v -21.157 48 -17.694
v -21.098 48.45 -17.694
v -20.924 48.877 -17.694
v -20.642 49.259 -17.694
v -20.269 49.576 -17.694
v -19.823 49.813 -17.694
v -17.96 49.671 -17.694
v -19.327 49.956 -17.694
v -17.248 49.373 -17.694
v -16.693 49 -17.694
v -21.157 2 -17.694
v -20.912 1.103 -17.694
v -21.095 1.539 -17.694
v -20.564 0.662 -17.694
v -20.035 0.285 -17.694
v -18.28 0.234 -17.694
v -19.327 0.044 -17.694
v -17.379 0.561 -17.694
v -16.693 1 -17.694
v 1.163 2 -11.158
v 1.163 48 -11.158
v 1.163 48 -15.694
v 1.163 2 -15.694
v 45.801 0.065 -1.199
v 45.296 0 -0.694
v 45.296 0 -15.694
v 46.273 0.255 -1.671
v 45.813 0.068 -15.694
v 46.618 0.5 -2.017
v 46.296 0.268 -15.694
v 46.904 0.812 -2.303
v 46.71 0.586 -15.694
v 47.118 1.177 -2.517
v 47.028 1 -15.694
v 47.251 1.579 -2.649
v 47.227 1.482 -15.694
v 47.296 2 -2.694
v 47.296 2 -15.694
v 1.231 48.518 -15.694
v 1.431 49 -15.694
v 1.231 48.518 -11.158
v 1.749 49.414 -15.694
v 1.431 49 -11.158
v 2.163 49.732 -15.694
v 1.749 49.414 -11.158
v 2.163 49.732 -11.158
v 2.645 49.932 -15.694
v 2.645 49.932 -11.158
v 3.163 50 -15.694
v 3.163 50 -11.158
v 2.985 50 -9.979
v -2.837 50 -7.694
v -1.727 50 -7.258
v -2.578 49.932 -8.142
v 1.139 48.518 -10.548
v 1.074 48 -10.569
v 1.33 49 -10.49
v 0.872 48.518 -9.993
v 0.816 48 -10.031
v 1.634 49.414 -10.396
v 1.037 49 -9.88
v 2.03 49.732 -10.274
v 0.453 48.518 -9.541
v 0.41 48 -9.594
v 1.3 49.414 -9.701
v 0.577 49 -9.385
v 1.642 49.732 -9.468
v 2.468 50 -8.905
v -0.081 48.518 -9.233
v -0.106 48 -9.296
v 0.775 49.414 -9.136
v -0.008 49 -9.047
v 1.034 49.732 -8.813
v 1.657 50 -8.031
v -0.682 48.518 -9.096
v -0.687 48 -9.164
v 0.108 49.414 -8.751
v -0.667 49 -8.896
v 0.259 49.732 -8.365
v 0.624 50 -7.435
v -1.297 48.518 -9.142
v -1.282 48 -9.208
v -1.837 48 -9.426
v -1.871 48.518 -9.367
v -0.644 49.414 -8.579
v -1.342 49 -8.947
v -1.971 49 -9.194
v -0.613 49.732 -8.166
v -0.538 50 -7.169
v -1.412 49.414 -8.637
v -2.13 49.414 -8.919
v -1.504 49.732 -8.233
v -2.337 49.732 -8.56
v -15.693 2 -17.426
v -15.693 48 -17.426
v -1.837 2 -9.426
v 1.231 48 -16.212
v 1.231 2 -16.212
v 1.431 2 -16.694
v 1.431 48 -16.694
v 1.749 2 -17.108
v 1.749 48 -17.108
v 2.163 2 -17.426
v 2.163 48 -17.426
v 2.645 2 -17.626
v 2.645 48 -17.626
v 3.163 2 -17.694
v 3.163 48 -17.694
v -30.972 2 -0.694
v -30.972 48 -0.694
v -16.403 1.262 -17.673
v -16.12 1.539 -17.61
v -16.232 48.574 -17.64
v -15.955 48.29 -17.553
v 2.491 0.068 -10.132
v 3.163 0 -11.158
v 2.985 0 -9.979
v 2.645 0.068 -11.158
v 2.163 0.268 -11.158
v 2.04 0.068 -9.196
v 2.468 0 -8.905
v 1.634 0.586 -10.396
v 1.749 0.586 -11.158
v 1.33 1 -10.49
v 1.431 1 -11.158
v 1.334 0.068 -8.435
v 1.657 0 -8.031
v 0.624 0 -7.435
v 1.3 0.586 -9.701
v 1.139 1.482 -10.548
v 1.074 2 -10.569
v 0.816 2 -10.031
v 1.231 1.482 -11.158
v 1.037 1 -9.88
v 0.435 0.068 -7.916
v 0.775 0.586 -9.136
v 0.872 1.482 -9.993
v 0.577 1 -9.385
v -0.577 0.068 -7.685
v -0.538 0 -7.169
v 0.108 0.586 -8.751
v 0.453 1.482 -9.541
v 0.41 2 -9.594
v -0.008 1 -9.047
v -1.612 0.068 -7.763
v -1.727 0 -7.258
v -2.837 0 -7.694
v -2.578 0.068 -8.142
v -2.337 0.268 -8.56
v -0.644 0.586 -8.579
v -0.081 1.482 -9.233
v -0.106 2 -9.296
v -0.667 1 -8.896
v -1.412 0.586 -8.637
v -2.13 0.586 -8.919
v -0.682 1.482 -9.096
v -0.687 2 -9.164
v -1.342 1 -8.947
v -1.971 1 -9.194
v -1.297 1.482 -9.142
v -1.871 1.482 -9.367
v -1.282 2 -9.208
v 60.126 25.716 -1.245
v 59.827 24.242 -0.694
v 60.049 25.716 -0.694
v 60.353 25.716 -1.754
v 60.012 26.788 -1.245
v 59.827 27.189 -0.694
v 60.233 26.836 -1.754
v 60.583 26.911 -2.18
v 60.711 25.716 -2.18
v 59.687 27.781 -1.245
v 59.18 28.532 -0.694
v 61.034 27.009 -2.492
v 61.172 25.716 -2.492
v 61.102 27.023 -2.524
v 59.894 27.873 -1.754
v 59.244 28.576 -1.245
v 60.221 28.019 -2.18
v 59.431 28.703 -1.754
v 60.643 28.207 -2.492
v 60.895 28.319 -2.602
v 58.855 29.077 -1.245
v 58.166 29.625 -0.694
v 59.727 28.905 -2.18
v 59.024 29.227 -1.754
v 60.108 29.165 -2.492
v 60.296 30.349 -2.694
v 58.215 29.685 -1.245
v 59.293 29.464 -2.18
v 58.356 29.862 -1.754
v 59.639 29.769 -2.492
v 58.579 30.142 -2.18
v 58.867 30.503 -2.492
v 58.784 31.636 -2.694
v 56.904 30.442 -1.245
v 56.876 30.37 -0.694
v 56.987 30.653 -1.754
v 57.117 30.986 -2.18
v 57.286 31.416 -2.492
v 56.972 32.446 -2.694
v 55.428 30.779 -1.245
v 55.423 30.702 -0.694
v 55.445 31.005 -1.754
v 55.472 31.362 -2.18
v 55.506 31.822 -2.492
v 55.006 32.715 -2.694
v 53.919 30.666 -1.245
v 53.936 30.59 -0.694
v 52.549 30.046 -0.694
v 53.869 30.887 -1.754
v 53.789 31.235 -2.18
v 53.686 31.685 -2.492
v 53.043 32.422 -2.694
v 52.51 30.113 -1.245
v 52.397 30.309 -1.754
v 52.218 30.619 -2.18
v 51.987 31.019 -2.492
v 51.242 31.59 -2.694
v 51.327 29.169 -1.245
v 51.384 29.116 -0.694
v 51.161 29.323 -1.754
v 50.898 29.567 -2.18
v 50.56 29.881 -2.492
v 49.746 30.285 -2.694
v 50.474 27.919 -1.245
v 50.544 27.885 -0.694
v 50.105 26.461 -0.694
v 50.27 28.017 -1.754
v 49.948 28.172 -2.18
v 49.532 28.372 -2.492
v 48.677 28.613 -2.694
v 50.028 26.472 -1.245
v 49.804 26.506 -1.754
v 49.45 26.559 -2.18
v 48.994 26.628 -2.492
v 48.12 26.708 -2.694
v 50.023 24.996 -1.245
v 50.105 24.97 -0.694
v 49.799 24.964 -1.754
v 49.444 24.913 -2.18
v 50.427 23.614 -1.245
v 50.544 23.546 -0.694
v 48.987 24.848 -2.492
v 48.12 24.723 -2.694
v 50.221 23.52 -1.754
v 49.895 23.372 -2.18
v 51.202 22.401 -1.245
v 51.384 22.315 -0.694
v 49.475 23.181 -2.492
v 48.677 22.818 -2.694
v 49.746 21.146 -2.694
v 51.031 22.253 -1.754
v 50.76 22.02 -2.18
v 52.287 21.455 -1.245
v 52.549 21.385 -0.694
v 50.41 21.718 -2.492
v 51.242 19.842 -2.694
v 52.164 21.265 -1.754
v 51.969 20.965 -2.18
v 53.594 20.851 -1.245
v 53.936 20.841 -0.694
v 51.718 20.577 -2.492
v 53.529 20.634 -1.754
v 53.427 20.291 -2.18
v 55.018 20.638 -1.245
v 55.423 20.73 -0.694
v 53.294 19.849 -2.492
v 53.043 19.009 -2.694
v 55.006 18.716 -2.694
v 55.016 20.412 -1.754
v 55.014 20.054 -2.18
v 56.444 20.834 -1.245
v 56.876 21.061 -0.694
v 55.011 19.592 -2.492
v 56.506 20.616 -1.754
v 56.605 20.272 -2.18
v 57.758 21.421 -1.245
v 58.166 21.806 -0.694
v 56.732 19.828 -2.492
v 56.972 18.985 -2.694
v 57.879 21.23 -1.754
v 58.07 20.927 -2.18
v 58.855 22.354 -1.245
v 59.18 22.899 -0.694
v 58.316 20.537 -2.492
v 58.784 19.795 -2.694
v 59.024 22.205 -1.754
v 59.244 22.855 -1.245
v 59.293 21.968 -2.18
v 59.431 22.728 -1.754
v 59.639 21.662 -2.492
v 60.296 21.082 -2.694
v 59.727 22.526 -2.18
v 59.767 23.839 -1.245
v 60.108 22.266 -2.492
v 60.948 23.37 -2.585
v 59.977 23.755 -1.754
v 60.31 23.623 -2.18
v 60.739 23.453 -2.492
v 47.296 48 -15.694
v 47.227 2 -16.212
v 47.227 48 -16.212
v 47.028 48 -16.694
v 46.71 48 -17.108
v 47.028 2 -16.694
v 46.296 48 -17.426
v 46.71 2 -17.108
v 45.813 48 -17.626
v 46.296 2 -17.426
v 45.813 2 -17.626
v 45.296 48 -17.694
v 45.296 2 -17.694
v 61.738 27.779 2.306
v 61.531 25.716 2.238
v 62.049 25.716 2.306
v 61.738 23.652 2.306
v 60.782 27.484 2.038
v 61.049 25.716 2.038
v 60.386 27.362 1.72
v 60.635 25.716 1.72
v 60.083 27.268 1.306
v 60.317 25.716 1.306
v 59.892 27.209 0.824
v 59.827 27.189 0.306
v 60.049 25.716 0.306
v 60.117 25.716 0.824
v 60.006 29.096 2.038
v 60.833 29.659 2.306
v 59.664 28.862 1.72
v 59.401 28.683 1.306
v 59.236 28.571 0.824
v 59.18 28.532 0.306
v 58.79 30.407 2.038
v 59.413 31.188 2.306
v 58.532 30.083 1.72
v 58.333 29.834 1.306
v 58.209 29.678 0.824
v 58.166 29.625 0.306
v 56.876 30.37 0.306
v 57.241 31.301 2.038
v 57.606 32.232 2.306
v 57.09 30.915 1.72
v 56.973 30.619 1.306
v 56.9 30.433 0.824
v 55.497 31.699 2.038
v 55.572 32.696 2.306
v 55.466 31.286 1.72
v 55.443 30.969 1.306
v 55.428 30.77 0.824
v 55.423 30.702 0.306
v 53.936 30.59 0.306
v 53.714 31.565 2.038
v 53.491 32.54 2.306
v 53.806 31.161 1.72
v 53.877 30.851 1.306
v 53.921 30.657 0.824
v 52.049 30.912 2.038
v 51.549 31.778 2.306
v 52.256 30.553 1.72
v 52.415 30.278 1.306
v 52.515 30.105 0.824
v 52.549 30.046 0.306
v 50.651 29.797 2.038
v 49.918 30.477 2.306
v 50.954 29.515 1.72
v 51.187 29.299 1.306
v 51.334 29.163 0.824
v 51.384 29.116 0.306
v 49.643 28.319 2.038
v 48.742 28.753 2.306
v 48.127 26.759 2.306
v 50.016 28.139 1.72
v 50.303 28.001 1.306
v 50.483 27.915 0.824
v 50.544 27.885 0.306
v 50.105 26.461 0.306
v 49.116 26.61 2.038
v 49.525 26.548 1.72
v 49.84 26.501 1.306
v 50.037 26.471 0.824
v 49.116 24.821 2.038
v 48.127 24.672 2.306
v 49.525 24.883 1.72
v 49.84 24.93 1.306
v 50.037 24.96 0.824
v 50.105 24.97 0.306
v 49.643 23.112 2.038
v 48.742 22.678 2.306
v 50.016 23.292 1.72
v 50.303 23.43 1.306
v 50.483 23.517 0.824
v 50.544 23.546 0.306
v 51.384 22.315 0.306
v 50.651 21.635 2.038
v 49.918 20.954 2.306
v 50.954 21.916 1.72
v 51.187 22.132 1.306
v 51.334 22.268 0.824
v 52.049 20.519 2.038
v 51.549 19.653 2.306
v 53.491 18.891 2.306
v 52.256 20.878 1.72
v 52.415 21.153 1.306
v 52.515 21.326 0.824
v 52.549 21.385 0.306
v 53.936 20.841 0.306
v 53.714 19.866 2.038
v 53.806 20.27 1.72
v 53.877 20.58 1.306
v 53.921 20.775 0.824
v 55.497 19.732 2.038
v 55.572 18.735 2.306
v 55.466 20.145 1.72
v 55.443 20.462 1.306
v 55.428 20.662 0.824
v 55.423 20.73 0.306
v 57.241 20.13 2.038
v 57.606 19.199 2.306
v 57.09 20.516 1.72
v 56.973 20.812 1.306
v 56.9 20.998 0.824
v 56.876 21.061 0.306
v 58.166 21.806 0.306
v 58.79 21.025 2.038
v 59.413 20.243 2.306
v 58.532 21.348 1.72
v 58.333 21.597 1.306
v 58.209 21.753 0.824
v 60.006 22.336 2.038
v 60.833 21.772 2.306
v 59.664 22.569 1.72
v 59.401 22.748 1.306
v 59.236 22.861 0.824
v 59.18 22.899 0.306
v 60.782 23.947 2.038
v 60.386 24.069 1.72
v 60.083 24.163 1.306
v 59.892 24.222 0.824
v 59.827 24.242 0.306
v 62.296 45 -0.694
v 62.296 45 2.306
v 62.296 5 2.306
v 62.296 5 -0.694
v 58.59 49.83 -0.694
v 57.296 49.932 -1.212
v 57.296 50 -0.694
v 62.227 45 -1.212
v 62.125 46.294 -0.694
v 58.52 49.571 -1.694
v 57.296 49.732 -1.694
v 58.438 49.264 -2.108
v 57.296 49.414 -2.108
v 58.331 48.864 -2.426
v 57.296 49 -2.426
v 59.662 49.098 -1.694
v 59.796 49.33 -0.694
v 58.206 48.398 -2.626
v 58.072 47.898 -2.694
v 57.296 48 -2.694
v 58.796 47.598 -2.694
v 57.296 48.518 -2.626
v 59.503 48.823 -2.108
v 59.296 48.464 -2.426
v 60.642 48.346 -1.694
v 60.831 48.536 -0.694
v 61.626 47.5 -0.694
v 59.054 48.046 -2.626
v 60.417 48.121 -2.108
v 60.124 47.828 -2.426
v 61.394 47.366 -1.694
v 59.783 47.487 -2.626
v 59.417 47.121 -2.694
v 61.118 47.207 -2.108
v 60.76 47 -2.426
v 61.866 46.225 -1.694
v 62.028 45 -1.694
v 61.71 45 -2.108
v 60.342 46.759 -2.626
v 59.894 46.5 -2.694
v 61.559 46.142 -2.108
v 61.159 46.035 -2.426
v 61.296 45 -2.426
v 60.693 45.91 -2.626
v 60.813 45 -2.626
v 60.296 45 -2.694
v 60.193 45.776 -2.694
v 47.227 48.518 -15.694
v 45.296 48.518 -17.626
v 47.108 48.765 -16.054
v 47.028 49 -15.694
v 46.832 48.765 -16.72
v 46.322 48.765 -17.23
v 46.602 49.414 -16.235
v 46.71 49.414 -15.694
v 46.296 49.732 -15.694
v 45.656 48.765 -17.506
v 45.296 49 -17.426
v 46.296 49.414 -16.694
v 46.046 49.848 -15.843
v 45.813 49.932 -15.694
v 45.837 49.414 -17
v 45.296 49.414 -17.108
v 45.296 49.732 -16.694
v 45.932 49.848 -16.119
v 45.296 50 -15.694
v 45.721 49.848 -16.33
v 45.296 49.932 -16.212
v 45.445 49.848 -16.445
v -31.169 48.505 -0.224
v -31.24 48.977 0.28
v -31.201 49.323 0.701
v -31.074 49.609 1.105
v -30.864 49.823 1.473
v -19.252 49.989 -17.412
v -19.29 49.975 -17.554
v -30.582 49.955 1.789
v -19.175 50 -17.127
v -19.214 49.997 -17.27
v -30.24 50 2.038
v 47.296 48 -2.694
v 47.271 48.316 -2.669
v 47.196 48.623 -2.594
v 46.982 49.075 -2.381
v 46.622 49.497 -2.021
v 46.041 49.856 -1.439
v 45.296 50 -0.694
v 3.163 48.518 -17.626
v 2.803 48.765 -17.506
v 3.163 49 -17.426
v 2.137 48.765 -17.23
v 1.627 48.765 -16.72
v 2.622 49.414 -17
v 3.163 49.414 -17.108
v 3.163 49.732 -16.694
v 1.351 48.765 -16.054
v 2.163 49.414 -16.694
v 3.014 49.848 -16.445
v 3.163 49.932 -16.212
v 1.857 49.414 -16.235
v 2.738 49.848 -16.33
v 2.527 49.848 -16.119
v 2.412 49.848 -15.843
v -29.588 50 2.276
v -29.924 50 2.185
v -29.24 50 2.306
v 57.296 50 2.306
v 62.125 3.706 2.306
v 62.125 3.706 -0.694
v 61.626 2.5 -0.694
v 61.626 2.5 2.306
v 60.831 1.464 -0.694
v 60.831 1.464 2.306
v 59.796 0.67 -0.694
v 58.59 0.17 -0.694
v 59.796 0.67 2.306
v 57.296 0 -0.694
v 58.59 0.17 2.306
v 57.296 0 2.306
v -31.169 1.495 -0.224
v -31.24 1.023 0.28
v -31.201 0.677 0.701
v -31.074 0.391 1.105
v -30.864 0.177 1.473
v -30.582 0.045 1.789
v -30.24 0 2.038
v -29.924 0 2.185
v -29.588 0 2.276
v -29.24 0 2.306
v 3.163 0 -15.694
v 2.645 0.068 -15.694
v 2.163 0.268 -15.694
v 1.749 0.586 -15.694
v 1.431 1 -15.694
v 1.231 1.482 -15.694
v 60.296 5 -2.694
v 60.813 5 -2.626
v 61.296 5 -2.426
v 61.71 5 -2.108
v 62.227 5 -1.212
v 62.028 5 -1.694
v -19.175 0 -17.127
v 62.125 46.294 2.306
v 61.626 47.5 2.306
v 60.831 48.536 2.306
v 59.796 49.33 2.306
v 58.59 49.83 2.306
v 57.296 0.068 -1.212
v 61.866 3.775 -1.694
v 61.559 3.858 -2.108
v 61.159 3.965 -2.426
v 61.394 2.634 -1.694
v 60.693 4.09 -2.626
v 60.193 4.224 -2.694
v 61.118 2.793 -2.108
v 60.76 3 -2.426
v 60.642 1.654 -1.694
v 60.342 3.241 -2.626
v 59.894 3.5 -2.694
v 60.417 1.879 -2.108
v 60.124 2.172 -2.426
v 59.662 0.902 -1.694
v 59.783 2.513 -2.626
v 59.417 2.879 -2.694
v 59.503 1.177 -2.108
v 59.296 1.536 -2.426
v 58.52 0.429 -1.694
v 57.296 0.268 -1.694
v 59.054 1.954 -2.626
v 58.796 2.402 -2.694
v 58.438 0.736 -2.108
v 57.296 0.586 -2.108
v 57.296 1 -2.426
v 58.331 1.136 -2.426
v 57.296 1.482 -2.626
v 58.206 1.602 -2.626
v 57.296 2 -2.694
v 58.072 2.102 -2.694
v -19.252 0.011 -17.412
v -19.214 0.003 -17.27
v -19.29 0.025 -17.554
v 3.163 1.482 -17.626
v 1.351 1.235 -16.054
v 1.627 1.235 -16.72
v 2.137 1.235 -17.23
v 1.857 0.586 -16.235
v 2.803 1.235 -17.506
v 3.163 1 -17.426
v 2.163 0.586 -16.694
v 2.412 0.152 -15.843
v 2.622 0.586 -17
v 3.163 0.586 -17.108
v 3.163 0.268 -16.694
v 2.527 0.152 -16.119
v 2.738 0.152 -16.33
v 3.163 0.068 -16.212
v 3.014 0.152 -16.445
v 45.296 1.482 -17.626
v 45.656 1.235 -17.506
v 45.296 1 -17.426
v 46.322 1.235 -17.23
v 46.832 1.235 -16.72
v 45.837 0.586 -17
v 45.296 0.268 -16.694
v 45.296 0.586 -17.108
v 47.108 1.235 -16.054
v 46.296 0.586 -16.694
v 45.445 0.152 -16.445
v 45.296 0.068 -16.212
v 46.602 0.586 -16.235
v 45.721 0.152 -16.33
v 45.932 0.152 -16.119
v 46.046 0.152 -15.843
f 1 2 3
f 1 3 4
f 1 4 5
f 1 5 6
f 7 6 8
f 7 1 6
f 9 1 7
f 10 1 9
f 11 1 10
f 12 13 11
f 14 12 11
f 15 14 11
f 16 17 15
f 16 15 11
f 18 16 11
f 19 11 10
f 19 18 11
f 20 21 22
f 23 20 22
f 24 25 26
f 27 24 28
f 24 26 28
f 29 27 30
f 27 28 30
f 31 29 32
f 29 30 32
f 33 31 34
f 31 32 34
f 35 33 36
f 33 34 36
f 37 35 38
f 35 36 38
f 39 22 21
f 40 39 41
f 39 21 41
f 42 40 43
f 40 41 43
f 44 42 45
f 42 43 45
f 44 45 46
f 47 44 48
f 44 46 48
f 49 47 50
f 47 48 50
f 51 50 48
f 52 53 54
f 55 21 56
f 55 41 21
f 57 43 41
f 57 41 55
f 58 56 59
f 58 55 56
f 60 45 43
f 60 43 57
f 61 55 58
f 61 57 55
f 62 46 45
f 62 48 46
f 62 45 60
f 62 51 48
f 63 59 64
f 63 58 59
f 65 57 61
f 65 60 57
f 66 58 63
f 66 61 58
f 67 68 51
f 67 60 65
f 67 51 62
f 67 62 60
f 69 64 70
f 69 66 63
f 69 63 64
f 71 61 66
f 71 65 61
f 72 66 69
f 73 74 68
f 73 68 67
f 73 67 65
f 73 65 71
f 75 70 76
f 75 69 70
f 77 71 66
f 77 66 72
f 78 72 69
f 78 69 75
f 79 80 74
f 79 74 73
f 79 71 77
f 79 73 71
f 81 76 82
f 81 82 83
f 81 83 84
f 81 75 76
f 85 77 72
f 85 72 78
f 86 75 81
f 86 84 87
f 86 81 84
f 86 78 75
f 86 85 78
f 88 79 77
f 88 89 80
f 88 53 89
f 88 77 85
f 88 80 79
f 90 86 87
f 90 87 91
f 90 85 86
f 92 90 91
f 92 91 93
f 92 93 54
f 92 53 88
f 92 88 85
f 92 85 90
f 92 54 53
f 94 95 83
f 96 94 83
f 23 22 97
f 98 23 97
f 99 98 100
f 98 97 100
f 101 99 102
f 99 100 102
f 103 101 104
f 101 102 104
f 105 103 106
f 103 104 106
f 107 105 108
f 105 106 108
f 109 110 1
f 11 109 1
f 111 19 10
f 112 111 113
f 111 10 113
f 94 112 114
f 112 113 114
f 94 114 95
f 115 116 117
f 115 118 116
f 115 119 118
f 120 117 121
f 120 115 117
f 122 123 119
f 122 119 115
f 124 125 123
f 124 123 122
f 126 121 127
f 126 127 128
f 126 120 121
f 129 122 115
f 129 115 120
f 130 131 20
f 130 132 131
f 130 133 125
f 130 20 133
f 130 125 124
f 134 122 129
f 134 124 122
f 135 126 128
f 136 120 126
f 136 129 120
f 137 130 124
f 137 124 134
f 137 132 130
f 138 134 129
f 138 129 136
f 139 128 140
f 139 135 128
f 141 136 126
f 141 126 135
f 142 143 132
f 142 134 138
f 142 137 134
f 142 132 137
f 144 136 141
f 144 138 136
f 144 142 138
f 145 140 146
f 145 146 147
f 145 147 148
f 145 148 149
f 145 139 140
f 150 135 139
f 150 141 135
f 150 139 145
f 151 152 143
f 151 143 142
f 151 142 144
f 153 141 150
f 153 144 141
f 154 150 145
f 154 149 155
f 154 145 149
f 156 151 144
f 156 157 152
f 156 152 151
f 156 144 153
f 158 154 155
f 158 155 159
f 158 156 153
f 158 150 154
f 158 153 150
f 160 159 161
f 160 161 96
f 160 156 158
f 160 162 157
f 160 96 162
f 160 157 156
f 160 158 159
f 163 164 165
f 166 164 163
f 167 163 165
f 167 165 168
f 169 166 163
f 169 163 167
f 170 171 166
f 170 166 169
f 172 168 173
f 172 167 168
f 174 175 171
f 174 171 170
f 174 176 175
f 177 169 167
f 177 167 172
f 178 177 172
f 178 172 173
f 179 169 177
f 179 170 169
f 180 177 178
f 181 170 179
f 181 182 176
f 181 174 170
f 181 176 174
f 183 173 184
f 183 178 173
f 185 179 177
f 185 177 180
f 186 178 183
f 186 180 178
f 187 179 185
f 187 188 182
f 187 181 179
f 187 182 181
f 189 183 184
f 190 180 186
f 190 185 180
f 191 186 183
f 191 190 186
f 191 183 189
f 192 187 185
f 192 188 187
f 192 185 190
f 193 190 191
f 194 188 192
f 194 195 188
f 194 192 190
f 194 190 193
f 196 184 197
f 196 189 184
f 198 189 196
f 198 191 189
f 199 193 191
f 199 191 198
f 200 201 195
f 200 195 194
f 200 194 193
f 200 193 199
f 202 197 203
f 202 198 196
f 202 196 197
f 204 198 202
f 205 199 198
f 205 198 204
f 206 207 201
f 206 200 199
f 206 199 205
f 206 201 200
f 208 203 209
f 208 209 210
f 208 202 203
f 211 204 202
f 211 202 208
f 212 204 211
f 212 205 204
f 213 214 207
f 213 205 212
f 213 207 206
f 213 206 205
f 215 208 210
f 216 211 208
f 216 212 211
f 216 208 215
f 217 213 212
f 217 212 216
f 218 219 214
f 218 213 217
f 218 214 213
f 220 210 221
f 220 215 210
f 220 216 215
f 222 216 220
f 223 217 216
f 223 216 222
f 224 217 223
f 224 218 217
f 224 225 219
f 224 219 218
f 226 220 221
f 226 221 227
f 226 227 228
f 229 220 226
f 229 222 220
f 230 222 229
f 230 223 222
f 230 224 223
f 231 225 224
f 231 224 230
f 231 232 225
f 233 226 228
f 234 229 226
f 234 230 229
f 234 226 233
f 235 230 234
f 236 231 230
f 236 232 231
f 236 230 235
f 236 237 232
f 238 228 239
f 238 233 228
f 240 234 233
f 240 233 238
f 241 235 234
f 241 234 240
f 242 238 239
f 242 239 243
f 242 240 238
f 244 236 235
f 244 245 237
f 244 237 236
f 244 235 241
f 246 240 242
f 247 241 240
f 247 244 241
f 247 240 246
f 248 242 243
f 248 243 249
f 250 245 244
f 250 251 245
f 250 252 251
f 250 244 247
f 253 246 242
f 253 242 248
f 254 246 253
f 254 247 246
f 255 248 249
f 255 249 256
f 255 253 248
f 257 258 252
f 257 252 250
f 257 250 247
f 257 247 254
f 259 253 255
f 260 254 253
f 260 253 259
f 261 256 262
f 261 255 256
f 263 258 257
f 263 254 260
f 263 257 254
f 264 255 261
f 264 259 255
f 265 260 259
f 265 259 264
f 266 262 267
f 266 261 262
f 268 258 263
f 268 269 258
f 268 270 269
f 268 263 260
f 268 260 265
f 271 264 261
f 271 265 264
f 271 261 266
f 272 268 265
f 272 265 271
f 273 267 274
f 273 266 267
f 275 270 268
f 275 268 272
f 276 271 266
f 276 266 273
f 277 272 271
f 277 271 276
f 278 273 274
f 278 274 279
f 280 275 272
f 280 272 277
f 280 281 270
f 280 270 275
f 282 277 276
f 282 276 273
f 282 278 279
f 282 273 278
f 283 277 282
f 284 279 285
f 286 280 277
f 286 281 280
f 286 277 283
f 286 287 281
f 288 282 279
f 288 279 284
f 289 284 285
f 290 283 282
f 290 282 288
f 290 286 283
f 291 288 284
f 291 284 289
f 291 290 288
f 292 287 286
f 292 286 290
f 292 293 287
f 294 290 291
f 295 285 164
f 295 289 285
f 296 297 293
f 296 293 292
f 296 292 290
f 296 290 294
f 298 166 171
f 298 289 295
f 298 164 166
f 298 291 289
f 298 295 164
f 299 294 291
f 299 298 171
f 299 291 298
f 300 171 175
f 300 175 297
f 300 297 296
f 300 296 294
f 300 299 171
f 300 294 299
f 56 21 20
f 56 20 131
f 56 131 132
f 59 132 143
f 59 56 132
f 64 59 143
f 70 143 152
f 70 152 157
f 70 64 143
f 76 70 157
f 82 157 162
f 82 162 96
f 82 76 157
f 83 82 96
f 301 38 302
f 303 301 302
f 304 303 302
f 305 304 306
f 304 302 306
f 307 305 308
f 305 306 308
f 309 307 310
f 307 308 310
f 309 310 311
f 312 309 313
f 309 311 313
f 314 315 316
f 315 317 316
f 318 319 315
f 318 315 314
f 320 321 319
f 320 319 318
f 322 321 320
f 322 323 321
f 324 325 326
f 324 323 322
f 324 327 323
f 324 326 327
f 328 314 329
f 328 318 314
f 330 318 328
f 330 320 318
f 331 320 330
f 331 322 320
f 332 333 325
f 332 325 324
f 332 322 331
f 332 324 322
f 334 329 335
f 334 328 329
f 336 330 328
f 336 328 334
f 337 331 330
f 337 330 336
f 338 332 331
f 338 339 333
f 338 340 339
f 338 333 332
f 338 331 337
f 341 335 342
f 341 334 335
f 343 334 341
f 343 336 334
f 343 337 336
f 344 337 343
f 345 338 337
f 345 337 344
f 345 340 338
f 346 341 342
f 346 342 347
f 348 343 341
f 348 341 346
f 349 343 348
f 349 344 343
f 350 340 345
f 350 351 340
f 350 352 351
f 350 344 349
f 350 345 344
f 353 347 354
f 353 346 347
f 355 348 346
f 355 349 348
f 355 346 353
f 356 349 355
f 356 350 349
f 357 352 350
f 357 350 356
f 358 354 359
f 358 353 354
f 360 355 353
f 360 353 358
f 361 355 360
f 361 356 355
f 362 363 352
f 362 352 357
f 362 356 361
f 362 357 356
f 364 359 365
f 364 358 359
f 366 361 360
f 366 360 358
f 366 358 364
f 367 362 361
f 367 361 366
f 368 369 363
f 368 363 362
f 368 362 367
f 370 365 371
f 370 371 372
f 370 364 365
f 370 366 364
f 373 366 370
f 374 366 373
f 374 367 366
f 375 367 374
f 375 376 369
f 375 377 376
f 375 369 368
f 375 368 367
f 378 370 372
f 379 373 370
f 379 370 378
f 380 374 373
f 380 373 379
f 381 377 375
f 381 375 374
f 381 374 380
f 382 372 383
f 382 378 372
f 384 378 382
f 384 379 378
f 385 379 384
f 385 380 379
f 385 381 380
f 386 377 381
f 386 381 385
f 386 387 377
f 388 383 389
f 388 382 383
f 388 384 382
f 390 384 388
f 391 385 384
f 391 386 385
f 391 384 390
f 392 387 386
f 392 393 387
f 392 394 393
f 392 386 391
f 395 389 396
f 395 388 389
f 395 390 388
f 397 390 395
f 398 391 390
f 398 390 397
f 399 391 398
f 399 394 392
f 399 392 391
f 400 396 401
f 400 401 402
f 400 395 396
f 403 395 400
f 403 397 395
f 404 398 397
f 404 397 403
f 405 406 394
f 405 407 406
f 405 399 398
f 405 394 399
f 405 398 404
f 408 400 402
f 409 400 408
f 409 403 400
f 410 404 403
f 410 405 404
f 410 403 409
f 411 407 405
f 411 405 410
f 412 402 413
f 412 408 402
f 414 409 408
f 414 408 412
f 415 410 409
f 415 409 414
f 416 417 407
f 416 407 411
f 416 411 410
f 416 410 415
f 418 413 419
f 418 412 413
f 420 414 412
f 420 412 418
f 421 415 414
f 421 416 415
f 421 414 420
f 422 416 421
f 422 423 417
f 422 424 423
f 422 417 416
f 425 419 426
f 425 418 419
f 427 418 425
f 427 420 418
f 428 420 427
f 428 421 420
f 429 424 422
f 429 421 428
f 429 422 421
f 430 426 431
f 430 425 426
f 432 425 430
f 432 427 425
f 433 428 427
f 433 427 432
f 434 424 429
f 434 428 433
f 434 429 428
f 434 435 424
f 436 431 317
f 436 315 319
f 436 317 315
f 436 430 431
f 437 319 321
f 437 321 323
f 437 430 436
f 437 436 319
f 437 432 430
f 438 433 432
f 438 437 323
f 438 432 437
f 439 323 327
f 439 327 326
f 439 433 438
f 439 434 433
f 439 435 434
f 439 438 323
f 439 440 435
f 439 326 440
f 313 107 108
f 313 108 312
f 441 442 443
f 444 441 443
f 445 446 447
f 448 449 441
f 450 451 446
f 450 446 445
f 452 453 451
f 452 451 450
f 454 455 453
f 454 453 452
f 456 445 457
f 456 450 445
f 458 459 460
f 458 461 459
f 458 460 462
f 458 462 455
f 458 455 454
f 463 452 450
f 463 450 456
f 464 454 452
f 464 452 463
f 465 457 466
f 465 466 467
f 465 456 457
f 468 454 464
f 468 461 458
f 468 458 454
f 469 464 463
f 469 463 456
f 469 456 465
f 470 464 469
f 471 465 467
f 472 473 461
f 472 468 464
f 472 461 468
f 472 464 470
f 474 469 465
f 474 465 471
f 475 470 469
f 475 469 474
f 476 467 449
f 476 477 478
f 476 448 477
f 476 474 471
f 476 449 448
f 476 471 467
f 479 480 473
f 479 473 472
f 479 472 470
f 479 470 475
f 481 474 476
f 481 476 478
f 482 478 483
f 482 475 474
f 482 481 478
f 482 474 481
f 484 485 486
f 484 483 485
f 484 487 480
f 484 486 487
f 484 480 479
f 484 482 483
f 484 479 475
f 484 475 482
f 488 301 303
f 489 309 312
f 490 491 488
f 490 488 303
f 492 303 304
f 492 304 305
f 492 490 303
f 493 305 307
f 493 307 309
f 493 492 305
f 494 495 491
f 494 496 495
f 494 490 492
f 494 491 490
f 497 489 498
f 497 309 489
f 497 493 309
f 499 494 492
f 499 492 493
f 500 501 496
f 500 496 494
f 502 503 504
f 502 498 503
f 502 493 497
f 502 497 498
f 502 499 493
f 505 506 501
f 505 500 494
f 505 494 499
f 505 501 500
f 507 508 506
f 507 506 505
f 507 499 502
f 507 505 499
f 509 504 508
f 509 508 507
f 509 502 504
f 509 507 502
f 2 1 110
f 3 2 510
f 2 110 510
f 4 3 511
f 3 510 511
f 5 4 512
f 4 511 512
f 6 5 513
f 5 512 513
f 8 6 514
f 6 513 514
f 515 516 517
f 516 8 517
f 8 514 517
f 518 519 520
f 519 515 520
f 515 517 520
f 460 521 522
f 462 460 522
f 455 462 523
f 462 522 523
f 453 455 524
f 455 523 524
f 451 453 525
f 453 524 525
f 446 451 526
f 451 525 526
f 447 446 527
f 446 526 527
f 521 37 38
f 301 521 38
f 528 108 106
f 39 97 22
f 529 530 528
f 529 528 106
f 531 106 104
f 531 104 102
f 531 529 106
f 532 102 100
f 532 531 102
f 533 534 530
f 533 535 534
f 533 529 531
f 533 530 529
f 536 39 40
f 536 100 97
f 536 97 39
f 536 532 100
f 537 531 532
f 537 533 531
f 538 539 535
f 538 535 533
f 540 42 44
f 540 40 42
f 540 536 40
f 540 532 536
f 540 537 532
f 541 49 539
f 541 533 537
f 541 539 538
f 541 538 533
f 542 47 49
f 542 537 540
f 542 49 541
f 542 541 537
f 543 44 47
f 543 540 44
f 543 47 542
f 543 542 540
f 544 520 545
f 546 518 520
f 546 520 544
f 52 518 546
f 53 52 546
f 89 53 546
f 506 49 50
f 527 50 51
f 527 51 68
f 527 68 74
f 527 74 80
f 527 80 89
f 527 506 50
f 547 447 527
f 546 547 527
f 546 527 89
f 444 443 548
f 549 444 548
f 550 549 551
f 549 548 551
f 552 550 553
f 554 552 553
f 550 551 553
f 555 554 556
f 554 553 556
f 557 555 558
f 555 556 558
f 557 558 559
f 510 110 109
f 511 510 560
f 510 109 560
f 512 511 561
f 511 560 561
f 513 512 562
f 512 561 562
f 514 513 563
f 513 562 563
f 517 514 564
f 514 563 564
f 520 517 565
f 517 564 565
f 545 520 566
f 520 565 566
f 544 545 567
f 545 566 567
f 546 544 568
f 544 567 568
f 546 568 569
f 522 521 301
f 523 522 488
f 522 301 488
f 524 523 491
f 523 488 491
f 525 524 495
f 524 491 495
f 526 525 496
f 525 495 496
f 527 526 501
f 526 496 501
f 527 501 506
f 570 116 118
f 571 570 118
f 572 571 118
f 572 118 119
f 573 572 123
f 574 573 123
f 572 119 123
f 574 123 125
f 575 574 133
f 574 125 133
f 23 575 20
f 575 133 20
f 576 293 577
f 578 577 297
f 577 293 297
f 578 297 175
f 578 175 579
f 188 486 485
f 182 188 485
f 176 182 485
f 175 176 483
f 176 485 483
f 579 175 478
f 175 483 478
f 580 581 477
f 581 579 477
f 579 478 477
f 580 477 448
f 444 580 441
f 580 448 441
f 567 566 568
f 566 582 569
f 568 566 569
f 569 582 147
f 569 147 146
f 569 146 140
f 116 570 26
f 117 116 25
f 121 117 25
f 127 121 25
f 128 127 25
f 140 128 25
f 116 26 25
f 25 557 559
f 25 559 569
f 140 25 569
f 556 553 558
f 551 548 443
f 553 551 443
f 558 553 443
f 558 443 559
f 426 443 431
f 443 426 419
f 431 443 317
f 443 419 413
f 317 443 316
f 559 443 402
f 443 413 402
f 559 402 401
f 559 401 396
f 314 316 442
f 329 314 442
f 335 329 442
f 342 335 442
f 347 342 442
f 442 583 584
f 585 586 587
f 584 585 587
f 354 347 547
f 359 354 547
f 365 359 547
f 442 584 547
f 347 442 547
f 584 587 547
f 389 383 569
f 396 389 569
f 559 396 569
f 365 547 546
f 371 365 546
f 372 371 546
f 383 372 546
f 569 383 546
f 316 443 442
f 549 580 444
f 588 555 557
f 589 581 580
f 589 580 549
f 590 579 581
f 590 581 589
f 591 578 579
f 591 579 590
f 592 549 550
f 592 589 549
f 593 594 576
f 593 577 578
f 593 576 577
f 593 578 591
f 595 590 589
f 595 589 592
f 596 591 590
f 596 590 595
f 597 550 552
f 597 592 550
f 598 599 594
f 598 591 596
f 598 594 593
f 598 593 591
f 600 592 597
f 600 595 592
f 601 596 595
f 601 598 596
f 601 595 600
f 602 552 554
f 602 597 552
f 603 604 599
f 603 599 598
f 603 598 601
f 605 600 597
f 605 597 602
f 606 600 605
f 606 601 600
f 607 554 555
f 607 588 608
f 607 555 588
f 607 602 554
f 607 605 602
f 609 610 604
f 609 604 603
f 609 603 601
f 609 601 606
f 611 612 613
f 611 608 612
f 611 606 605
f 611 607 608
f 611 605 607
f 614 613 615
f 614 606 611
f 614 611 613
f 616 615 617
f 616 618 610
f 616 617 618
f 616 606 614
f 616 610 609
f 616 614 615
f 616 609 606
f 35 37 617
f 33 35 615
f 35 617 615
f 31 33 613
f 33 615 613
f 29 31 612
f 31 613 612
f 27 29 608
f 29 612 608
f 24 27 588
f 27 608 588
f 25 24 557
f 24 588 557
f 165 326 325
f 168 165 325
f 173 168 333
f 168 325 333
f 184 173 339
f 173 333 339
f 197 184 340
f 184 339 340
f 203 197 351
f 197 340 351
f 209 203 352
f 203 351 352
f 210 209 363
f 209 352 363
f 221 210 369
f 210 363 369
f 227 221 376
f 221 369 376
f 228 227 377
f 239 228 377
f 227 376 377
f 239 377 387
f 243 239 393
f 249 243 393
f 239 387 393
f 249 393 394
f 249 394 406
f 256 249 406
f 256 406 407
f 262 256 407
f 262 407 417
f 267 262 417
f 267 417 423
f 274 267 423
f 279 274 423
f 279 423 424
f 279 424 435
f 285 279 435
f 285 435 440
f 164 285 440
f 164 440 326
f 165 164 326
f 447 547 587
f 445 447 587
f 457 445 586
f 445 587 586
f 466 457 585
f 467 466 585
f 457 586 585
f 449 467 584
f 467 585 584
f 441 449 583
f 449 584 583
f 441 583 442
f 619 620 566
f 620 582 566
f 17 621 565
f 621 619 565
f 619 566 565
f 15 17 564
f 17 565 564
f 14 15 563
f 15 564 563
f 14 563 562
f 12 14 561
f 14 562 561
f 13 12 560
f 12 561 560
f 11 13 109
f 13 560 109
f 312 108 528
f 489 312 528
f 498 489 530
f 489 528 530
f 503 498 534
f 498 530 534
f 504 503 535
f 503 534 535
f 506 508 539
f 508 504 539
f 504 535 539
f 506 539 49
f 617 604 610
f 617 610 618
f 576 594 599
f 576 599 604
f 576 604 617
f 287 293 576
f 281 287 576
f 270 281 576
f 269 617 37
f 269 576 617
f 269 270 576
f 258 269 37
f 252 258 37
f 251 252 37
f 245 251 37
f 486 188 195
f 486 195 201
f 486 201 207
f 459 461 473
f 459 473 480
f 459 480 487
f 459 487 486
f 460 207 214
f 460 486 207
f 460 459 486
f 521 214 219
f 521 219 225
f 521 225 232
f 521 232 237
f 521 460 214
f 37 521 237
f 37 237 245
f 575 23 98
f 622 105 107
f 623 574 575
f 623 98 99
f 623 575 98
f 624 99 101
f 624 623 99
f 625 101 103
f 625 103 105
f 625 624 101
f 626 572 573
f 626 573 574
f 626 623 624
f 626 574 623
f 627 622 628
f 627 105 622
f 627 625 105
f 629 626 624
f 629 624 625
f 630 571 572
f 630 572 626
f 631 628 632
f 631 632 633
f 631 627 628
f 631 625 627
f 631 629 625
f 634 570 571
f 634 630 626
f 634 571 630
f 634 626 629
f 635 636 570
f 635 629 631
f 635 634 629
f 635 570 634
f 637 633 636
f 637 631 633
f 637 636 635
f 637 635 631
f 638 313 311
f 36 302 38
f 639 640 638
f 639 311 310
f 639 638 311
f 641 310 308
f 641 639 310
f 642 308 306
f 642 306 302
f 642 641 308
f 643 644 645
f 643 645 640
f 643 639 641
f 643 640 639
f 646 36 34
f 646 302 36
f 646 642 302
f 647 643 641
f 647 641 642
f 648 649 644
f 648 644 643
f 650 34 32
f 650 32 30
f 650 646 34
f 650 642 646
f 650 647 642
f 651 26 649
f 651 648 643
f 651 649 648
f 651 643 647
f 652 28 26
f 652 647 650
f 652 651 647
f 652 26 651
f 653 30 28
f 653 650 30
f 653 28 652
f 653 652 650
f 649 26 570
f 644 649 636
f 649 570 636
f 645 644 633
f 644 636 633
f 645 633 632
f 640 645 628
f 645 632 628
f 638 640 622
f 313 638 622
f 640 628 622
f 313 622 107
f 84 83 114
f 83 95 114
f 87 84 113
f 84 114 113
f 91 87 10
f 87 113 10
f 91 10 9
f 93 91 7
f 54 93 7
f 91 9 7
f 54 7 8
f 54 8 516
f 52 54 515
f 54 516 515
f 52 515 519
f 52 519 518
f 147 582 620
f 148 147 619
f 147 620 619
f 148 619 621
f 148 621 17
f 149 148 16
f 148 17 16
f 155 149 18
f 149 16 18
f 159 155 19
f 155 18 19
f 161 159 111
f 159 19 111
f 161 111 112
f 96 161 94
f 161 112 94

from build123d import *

# Parameters (mm, degrees)
SKETCH2_W           = 80
SKETCH2_H           = 20
BOSS_EXTRUDE1_DEPTH = 50
CUT_EXTRUDE1_DEPTH  = 50
SKETCH5_R           = 5
BOSS_EXTRUDE2_DEPTH = 5
FILLET1_R           = 2


with BuildPart() as part:
    # Sketch2 → Boss-Extrude1 (new body)
    with BuildSketch(Plane(origin=(0, 0, 0), x_dir=(1, 0, 0), z_dir=(0, 1, 0))):
        with Locations((7.295597484, 7.693920335)):
            Rectangle(SKETCH2_W, SKETCH2_H)
    extrude(amount=BOSS_EXTRUDE1_DEPTH)

    # Sketch3 → Cut-Extrude1 (cut)
    with BuildSketch(Plane(origin=(0, 50, 0), x_dir=(1, 0, 0), z_dir=(0, 1, 0))):
        Polygon((-32.704402516, 17.693920335), (-32.704402516, -2.306079665), (-21.157397132, 17.693920335), align=None)
        Polygon((1.163110944, 17.693920335), (-16.157397132, 17.693920335), (1.163110944, 7.693920335), align=None)
    extrude(amount=-CUT_EXTRUDE1_DEPTH, mode=Mode.SUBTRACT)

    # Sketch5 → Boss-Extrude2 (add)
    with BuildSketch(Plane.XY.offset(2.306079665)):
        with BuildLine():
            Line((47.295597484, 50), (57.295597484, 50))
            ThreePointArc((57.295597484, 50), (60.83113139, 48.535533906), (62.295597484, 45))
            Line((62.295597484, 45), (62.295597484, 5))
            ThreePointArc((62.295597484, 5), (60.83113139, 1.464466094), (57.295597484, 0))
            Line((57.295597484, 0), (47.295597484, 0))
            Line((47.295597484, 0), (47.295597484, 50))
        make_face()
        with Locations((55.048868237, 25.715581395)):
            Circle(SKETCH5_R, mode=Mode.SUBTRACT)
    extrude(amount=-BOSS_EXTRUDE2_DEPTH)

    # Fillet1
    # the kernel refuses this fillet: 2 mm, written as the material it adds along each edge
    with BuildSketch(Plane(origin=(1.163110944, 50, -7.693920335), x_dir=(0, 0, -1), z_dir=(0, -1, 0))) as fillet1_piece_1:
        with BuildLine():
            CenterArc((FILLET1_R * 1.73205080757, -FILLET1_R), FILLET1_R, 90, 120)
            Line((FILLET1_R * 0.866025403784, -FILLET1_R * 1.5), (0, 0))
            Line((0, 0), (FILLET1_R * 1.73205080757, 0))
        make_face()
    extrude(amount=50)
    # the kernel refuses this fillet: 2 mm, written as the material it takes off along each edge
    with BuildSketch(Plane(origin=(3.163110944, 2, -15.693920335), x_dir=(-1, 0, 0), z_dir=(0, -1, 0))) as fillet1_2_piece_1_section:
        Polygon((0, 0), (FILLET1_R, 0), (FILLET1_R, FILLET1_R), (0, FILLET1_R), align=None)
    fillet1_2_piece_1 = extrude(amount=FILLET1_R, mode=Mode.PRIVATE)
    fillet1_2_piece_1 = fillet1_2_piece_1 - Plane(origin=(3.163110944, 2, -15.693920335), x_dir=(0.7071067811865475, 0, 0.7071067811865475), z_dir=(0, -1, 0)) * Sphere(FILLET1_R, mode=Mode.PRIVATE)
    add(fillet1_2_piece_1, mode=Mode.SUBTRACT)
    with BuildSketch(Plane(origin=(3.163110944, 48, -15.693920335), x_dir=(-1, 0, 0), z_dir=(0, 1, 0))) as fillet1_2_piece_2_section:
        Polygon((0, 0), (FILLET1_R, 0), (FILLET1_R, -FILLET1_R), (0, -FILLET1_R), align=None)
    fillet1_2_piece_2 = extrude(amount=FILLET1_R, mode=Mode.PRIVATE)
    fillet1_2_piece_2 = fillet1_2_piece_2 - Plane(origin=(3.163110944, 48, -15.693920335), x_dir=(0.7071067811865475, 0, 0.7071067811865475), z_dir=(0, 1, 0)) * Sphere(FILLET1_R, mode=Mode.PRIVATE)
    add(fillet1_2_piece_2, mode=Mode.SUBTRACT)
    with BuildSketch(Plane(origin=(45.295597484, 2, -15.693920335), x_dir=(0, 0, -1), z_dir=(0, -1, 0))) as fillet1_2_piece_3_section:
        Polygon((0, 0), (FILLET1_R, 0), (FILLET1_R, FILLET1_R), (0, FILLET1_R), align=None)
    fillet1_2_piece_3 = extrude(amount=FILLET1_R, mode=Mode.PRIVATE)
    fillet1_2_piece_3 = fillet1_2_piece_3 - Plane(origin=(45.295597484, 2, -15.693920335), x_dir=(-0.7071067811865474, 0, 0.7071067811865477), z_dir=(0, -1, 0)) * Sphere(FILLET1_R, mode=Mode.PRIVATE)
    add(fillet1_2_piece_3, mode=Mode.SUBTRACT)
    with BuildSketch(Plane(origin=(45.295597484, 48, -15.693920335), x_dir=(0, 0, -1), z_dir=(0, 1, 0))) as fillet1_2_piece_4_section:
        Polygon((0, 0), (FILLET1_R, 0), (FILLET1_R, -FILLET1_R), (0, -FILLET1_R), align=None)
    fillet1_2_piece_4 = extrude(amount=FILLET1_R, mode=Mode.PRIVATE)
    fillet1_2_piece_4 = fillet1_2_piece_4 - Plane(origin=(45.295597484, 48, -15.693920335), x_dir=(-0.7071067811865474, 0, 0.7071067811865477), z_dir=(0, 1, 0)) * Sphere(FILLET1_R, mode=Mode.PRIVATE)
    add(fillet1_2_piece_4, mode=Mode.SUBTRACT)
    with BuildSketch(Plane(origin=(1.163110944, 0, -11.158021951), x_dir=(1, 0, 0), z_dir=(0, 0, -1))) as fillet1_2_piece_5:
        with BuildLine():
            CenterArc((FILLET1_R, -FILLET1_R), FILLET1_R, 90, 90)
            Line((0, -FILLET1_R), (0, 0))
            Line((0, 0), (FILLET1_R, 0))
        make_face()
    extrude(amount=4.535898385, mode=Mode.SUBTRACT)
    with BuildSketch(Plane(origin=(1.163110944, 50, -11.158021951), x_dir=(1, 0, 0), z_dir=(0, 0, -1))) as fillet1_2_piece_6:
        with BuildLine():
            CenterArc((FILLET1_R, FILLET1_R), FILLET1_R, 180, 90)
            Line((0, FILLET1_R), (0, 0))
            Line((0, 0), (FILLET1_R, 0))
        make_face()
    extrude(amount=4.535898385, mode=Mode.SUBTRACT)
    with BuildSketch(Plane(origin=(57.295597484, 0, -2.693920335), x_dir=(0, 0, 1), z_dir=(-1, 0, 0)), Plane(origin=(47.295597484, 50, -2.693920335), x_dir=(0, 0, 1), z_dir=(1, 0, 0))) as fillet1_2_piece_7:
        with BuildLine():
            CenterArc((FILLET1_R, FILLET1_R), FILLET1_R, 180, 90)
            Line((0, FILLET1_R), (0, 0))
            Line((0, 0), (FILLET1_R, 0))
        make_face()
    extrude(amount=10, mode=Mode.SUBTRACT)
    with BuildSketch(Plane(origin=(57.295597484, 5, -2.693920335), x_dir=(1, 0, 0), z_dir=(0, 1, 0))) as fillet1_2_piece_8:
        with BuildLine():
            CenterArc((5 - FILLET1_R, -FILLET1_R), FILLET1_R, 0, 90)
            Line((5, -FILLET1_R), (5, 0))
            Line((5, 0), (5 - FILLET1_R, 0))
        make_face()
    revolve(axis=Axis((57.295597484, 5, -2.693920335), (0, 0, -1)), revolution_arc=90, mode=Mode.SUBTRACT)
    with BuildSketch(Plane(origin=(62.295597484, 45, -2.693920335), x_dir=(-1, 0, 0), z_dir=(0, -1, 0))) as fillet1_2_piece_9:
        with BuildLine():
            CenterArc((FILLET1_R, -FILLET1_R), FILLET1_R, 90, 90)
            Line((0, -FILLET1_R), (0, 0))
            Line((0, 0), (FILLET1_R, 0))
        make_face()
    extrude(amount=40, mode=Mode.SUBTRACT)
    with BuildSketch(Plane(origin=(57.295597484, 45, -2.693920335), x_dir=(0, 1, 0), z_dir=(-1, 0, 0))) as fillet1_2_piece_10:
        with BuildLine():
            CenterArc((5 - FILLET1_R, -FILLET1_R), FILLET1_R, 0, 90)
            Line((5, -FILLET1_R), (5, 0))
            Line((5, 0), (5 - FILLET1_R, 0))
        make_face()
    revolve(axis=Axis((57.295597484, 45, -2.693920335), (0, 0, -1)), revolution_arc=90, mode=Mode.SUBTRACT)
    with BuildSketch(Plane(origin=(47.295597484, 2, -17.693920335), x_dir=(-1, 0, 0), z_dir=(0, 1, 0))) as fillet1_2_piece_11:
        with BuildLine():
            CenterArc((FILLET1_R, FILLET1_R), FILLET1_R, 180, 90)
            Line((0, FILLET1_R), (0, 0))
            Line((0, 0), (FILLET1_R, 0))
        make_face()
    extrude(amount=46, mode=Mode.SUBTRACT)
    with BuildSketch(Plane(origin=(3.163110944, 50, -17.693920335), x_dir=(0, 0, 1), z_dir=(1, 0, 0))) as fillet1_2_piece_12:
        with BuildLine():
            CenterArc((FILLET1_R, FILLET1_R), FILLET1_R, 180, 90)
            Line((0, FILLET1_R), (0, 0))
            Line((0, 0), (FILLET1_R, 0))
        make_face()
    extrude(amount=42.132486541, mode=Mode.SUBTRACT)
    with BuildSketch(Plane(origin=(1.163110944, 48, -17.693920335), x_dir=(0, 0, 1), z_dir=(0, -1, 0))) as fillet1_2_piece_13:
        with BuildLine():
            CenterArc((FILLET1_R, -FILLET1_R), FILLET1_R, 90, 90)
            Line((0, -FILLET1_R), (0, 0))
            Line((0, 0), (FILLET1_R, 0))
        make_face()
    extrude(amount=46, mode=Mode.SUBTRACT)
    with BuildSketch(Plane(origin=(3.163110944, 0, -17.693920335), x_dir=(0, 0, 1), z_dir=(1, 0, 0))) as fillet1_2_piece_14:
        with BuildLine():
            CenterArc((FILLET1_R, -FILLET1_R), FILLET1_R, 90, 90)
            Line((0, -FILLET1_R), (0, 0))
            Line((0, 0), (FILLET1_R, 0))
        make_face()
    extrude(amount=42.132486541, mode=Mode.SUBTRACT)
    with BuildSketch(Plane(origin=(55.048868237, 25.715581395, 2.306079665), x_dir=(1, 0, 0), z_dir=(0, -1, 0))) as fillet1_2_piece_15:
        with BuildLine():
            CenterArc((5 + FILLET1_R, -FILLET1_R), FILLET1_R, 90, 90)
            Line((5, -FILLET1_R), (5, 0))
            Line((5, 0), (5 + FILLET1_R, 0))
        make_face()
    revolve(axis=Axis((55.048868237, 25.715581395, 2.306079665), (0, 0, 1)), mode=Mode.SUBTRACT)
    with BuildSketch(Plane(origin=(55.048868237, 25.715581395, -2.693920335), x_dir=(1, 0, 0), z_dir=(0, -1, 0))) as fillet1_2_piece_16:
        with BuildLine():
            CenterArc((5 + FILLET1_R, FILLET1_R), FILLET1_R, 180, 90)
            Line((5, FILLET1_R), (5, 0))
            Line((5, 0), (5 + FILLET1_R, 0))
        make_face()
    revolve(axis=Axis((55.048868237, 25.715581395, -2.693920335), (0, 0, 1)), mode=Mode.SUBTRACT)
    with BuildSketch(Plane(origin=(47.295597484, 0, -15.693920335), x_dir=(-1, 0, 0), z_dir=(0, 0, 1))) as fillet1_2_piece_17:
        with BuildLine():
            CenterArc((FILLET1_R, -FILLET1_R), FILLET1_R, 90, 90)
            Line((0, -FILLET1_R), (0, 0))
            Line((0, 0), (FILLET1_R, 0))
        make_face()
    extrude(amount=13, mode=Mode.SUBTRACT)
    with BuildSketch(Plane(origin=(47.295597484, 50, -15.693920335), x_dir=(-1, 0, 0), z_dir=(0, 0, 1))) as fillet1_2_piece_18:
        with BuildLine():
            CenterArc((FILLET1_R, FILLET1_R), FILLET1_R, 180, 90)
            Line((0, FILLET1_R), (0, 0))
            Line((0, 0), (FILLET1_R, 0))
        make_face()
    extrude(amount=13, mode=Mode.SUBTRACT)
    with BuildSketch(Plane(origin=(-20.487524151, 0, -20.193920335), x_dir=(-0.4999999999999946, 0, 0.8660254037844418), z_dir=(0.8660254037844418, 0, 0.4999999999999946)), Plane(origin=(-20.487524151, 50, -20.193920335), x_dir=(0, -1, 0), z_dir=(0.8660254037844418, 0, 0.4999999999999946))) as fillet1_2_piece_19:
        with BuildLine():
            CenterArc((FILLET1_R, -FILLET1_R), FILLET1_R, 90, 90)
            Line((0, -FILLET1_R), (0, 0))
            Line((0, 0), (FILLET1_R, 0))
        make_face()
    extrude(amount=21.535898385, mode=Mode.SUBTRACT)
    with BuildSketch(Plane(origin=(-16.157397132, 51.339745962, -17.693920335), x_dir=(-1, 0, 0), z_dir=(0, -1, 0))) as fillet1_2_piece_20:
        with BuildLine():
            CenterArc((FILLET1_R * 0.267949192431, -FILLET1_R), FILLET1_R, 90, 30)
            Line((-FILLET1_R * 0.232050807569, -FILLET1_R * 0.133974596216), (0, 0))
            Line((0, 0), (FILLET1_R * 0.267949192431, 0))
        make_face()
    extrude(amount=52.679491924, mode=Mode.SUBTRACT)
    with BuildSketch(Plane(origin=(-32.704402516, -8.660254038, 2.306079665), x_dir=(0.49999999999999467, 0, -0.8660254037844417), z_dir=(0, 1, 0))) as fillet1_2_piece_21:
        with BuildLine():
            CenterArc((FILLET1_R * 1.73205080757, -FILLET1_R), FILLET1_R, 90, 120)
            Line((FILLET1_R * 0.866025403784, -FILLET1_R * 1.5), (0, 0))
            Line((0, 0), (FILLET1_R * 1.73205080757, 0))
        make_face()
    extrude(amount=67.320508076, mode=Mode.SUBTRACT)
    with BuildSketch(Plane(origin=(-35.204402516, 0, 6.636206683), x_dir=(0.8660254037844418, 0, 0.49999999999999445), z_dir=(0.4999999999999945, 0, -0.8660254037844419))) as fillet1_2_piece_22:
        with BuildLine():
            CenterArc((FILLET1_R, -FILLET1_R), FILLET1_R, 90, 90)
            Line((0, -FILLET1_R), (0, 0))
            Line((0, 0), (FILLET1_R, 0))
        make_face()
    extrude(amount=33.094010768, mode=Mode.SUBTRACT)
    with BuildSketch(Plane(origin=(-35.204402516, 50, 6.636206683), x_dir=(0.8660254037844418, 0, 0.49999999999999445), z_dir=(0.4999999999999945, 0, -0.8660254037844419))) as fillet1_2_piece_23:
        with BuildLine():
            CenterArc((FILLET1_R, FILLET1_R), FILLET1_R, 180, 90)
            Line((0, FILLET1_R), (0, 0))
            Line((0, 0), (FILLET1_R, 0))
        make_face()
    extrude(amount=33.094010768, mode=Mode.SUBTRACT)
    with BuildSketch(Plane(origin=(-0.836889056, 50, -11.158021951), x_dir=(1, 0, 0), z_dir=(0, 0, -1))) as fillet1_2_piece_24:
        with BuildLine():
            CenterArc((2 + FILLET1_R, FILLET1_R), FILLET1_R, 180, 90)
            Line((2, FILLET1_R), (2, 0))
            Line((2, 0), (2 + FILLET1_R, 0))
        make_face()
    revolve(axis=Axis((-0.836889056, 50, -11.158021951), (0, -1, 0)), revolution_arc=120, mode=Mode.SUBTRACT)
    with BuildSketch(Plane(origin=(-0.836889056, 0, -11.158021951), x_dir=(1, 0, 0), z_dir=(0, 0, -1))) as fillet1_2_piece_25:
        with BuildLine():
            CenterArc((2 + FILLET1_R, -FILLET1_R), FILLET1_R, 90, 90)
            Line((2, -FILLET1_R), (2, 0))
            Line((2, 0), (2 + FILLET1_R, 0))
        make_face()
    revolve(axis=Axis((-0.836889056, 0, -11.158021951), (0, -1, 0)), revolution_arc=120, mode=Mode.SUBTRACT)
    with BuildSketch(Plane(origin=(47.295597484, 0, -15.693920335), x_dir=(-1, 0, 0), z_dir=(0, 0, 1))) as fillet1_2_piece_26a_section:
        with BuildLine():
            CenterArc((FILLET1_R, -FILLET1_R), FILLET1_R, 90, 90)
            Line((0, -FILLET1_R), (0, 0))
            Line((0, 0), (FILLET1_R, 0))
        make_face()
    fillet1_2_piece_26a = extrude(amount=18, mode=Mode.PRIVATE)
    fillet1_2_piece_26a = split(fillet1_2_piece_26a, bisect_by=Plane(origin=(46.842807256, 0.452790229, -2.693920335), z_dir=(0, 0, 1)), keep=Keep.TOP, mode=Mode.PRIVATE)
    with BuildSketch(Plane(origin=(57.295597484, 0, -2.693920335), x_dir=(0, 0, 1), z_dir=(-1, 0, 0))) as fillet1_2_piece_26b_section:
        with BuildLine():
            CenterArc((FILLET1_R, FILLET1_R), FILLET1_R, 180, 90)
            Line((0, FILLET1_R), (0, 0))
            Line((0, 0), (FILLET1_R, 0))
        make_face()
    fillet1_2_piece_26b = extrude(amount=15, mode=Mode.PRIVATE)
    fillet1_2_piece_26b = split(fillet1_2_piece_26b, bisect_by=Plane(origin=(47.295597484, 0.452790229, -2.241130107), z_dir=(-1, 0, 0)), keep=Keep.TOP, mode=Mode.PRIVATE)
    fillet1_2_piece_26 = fillet1_2_piece_26a & fillet1_2_piece_26b
    add(fillet1_2_piece_26, mode=Mode.SUBTRACT)
    with BuildSketch(Plane(origin=(47.295597484, 50, -15.693920335), x_dir=(-1, 0, 0), z_dir=(0, 0, 1))) as fillet1_2_piece_27a_section:
        with BuildLine():
            CenterArc((FILLET1_R, FILLET1_R), FILLET1_R, 180, 90)
            Line((0, FILLET1_R), (0, 0))
            Line((0, 0), (FILLET1_R, 0))
        make_face()
    fillet1_2_piece_27a = extrude(amount=18, mode=Mode.PRIVATE)
    fillet1_2_piece_27a = split(fillet1_2_piece_27a, bisect_by=Plane(origin=(46.842807256, 49.547209771, -2.693920335), z_dir=(0, 0, 1)), keep=Keep.TOP, mode=Mode.PRIVATE)
    with BuildSketch(Plane(origin=(42.295597484, 50, -2.693920335), x_dir=(0, 0, 1), z_dir=(1, 0, 0))) as fillet1_2_piece_27b_section:
        with BuildLine():
            CenterArc((FILLET1_R, FILLET1_R), FILLET1_R, 180, 90)
            Line((0, FILLET1_R), (0, 0))
            Line((0, 0), (FILLET1_R, 0))
        make_face()
    fillet1_2_piece_27b = extrude(amount=15, mode=Mode.PRIVATE)
    fillet1_2_piece_27b = split(fillet1_2_piece_27b, bisect_by=Plane(origin=(47.295597484, 49.547209771, -2.241130107), z_dir=(-1, 0, 0)), keep=Keep.TOP, mode=Mode.PRIVATE)
    fillet1_2_piece_27 = fillet1_2_piece_27a & fillet1_2_piece_27b
    add(fillet1_2_piece_27, mode=Mode.SUBTRACT)


solid = part.part
